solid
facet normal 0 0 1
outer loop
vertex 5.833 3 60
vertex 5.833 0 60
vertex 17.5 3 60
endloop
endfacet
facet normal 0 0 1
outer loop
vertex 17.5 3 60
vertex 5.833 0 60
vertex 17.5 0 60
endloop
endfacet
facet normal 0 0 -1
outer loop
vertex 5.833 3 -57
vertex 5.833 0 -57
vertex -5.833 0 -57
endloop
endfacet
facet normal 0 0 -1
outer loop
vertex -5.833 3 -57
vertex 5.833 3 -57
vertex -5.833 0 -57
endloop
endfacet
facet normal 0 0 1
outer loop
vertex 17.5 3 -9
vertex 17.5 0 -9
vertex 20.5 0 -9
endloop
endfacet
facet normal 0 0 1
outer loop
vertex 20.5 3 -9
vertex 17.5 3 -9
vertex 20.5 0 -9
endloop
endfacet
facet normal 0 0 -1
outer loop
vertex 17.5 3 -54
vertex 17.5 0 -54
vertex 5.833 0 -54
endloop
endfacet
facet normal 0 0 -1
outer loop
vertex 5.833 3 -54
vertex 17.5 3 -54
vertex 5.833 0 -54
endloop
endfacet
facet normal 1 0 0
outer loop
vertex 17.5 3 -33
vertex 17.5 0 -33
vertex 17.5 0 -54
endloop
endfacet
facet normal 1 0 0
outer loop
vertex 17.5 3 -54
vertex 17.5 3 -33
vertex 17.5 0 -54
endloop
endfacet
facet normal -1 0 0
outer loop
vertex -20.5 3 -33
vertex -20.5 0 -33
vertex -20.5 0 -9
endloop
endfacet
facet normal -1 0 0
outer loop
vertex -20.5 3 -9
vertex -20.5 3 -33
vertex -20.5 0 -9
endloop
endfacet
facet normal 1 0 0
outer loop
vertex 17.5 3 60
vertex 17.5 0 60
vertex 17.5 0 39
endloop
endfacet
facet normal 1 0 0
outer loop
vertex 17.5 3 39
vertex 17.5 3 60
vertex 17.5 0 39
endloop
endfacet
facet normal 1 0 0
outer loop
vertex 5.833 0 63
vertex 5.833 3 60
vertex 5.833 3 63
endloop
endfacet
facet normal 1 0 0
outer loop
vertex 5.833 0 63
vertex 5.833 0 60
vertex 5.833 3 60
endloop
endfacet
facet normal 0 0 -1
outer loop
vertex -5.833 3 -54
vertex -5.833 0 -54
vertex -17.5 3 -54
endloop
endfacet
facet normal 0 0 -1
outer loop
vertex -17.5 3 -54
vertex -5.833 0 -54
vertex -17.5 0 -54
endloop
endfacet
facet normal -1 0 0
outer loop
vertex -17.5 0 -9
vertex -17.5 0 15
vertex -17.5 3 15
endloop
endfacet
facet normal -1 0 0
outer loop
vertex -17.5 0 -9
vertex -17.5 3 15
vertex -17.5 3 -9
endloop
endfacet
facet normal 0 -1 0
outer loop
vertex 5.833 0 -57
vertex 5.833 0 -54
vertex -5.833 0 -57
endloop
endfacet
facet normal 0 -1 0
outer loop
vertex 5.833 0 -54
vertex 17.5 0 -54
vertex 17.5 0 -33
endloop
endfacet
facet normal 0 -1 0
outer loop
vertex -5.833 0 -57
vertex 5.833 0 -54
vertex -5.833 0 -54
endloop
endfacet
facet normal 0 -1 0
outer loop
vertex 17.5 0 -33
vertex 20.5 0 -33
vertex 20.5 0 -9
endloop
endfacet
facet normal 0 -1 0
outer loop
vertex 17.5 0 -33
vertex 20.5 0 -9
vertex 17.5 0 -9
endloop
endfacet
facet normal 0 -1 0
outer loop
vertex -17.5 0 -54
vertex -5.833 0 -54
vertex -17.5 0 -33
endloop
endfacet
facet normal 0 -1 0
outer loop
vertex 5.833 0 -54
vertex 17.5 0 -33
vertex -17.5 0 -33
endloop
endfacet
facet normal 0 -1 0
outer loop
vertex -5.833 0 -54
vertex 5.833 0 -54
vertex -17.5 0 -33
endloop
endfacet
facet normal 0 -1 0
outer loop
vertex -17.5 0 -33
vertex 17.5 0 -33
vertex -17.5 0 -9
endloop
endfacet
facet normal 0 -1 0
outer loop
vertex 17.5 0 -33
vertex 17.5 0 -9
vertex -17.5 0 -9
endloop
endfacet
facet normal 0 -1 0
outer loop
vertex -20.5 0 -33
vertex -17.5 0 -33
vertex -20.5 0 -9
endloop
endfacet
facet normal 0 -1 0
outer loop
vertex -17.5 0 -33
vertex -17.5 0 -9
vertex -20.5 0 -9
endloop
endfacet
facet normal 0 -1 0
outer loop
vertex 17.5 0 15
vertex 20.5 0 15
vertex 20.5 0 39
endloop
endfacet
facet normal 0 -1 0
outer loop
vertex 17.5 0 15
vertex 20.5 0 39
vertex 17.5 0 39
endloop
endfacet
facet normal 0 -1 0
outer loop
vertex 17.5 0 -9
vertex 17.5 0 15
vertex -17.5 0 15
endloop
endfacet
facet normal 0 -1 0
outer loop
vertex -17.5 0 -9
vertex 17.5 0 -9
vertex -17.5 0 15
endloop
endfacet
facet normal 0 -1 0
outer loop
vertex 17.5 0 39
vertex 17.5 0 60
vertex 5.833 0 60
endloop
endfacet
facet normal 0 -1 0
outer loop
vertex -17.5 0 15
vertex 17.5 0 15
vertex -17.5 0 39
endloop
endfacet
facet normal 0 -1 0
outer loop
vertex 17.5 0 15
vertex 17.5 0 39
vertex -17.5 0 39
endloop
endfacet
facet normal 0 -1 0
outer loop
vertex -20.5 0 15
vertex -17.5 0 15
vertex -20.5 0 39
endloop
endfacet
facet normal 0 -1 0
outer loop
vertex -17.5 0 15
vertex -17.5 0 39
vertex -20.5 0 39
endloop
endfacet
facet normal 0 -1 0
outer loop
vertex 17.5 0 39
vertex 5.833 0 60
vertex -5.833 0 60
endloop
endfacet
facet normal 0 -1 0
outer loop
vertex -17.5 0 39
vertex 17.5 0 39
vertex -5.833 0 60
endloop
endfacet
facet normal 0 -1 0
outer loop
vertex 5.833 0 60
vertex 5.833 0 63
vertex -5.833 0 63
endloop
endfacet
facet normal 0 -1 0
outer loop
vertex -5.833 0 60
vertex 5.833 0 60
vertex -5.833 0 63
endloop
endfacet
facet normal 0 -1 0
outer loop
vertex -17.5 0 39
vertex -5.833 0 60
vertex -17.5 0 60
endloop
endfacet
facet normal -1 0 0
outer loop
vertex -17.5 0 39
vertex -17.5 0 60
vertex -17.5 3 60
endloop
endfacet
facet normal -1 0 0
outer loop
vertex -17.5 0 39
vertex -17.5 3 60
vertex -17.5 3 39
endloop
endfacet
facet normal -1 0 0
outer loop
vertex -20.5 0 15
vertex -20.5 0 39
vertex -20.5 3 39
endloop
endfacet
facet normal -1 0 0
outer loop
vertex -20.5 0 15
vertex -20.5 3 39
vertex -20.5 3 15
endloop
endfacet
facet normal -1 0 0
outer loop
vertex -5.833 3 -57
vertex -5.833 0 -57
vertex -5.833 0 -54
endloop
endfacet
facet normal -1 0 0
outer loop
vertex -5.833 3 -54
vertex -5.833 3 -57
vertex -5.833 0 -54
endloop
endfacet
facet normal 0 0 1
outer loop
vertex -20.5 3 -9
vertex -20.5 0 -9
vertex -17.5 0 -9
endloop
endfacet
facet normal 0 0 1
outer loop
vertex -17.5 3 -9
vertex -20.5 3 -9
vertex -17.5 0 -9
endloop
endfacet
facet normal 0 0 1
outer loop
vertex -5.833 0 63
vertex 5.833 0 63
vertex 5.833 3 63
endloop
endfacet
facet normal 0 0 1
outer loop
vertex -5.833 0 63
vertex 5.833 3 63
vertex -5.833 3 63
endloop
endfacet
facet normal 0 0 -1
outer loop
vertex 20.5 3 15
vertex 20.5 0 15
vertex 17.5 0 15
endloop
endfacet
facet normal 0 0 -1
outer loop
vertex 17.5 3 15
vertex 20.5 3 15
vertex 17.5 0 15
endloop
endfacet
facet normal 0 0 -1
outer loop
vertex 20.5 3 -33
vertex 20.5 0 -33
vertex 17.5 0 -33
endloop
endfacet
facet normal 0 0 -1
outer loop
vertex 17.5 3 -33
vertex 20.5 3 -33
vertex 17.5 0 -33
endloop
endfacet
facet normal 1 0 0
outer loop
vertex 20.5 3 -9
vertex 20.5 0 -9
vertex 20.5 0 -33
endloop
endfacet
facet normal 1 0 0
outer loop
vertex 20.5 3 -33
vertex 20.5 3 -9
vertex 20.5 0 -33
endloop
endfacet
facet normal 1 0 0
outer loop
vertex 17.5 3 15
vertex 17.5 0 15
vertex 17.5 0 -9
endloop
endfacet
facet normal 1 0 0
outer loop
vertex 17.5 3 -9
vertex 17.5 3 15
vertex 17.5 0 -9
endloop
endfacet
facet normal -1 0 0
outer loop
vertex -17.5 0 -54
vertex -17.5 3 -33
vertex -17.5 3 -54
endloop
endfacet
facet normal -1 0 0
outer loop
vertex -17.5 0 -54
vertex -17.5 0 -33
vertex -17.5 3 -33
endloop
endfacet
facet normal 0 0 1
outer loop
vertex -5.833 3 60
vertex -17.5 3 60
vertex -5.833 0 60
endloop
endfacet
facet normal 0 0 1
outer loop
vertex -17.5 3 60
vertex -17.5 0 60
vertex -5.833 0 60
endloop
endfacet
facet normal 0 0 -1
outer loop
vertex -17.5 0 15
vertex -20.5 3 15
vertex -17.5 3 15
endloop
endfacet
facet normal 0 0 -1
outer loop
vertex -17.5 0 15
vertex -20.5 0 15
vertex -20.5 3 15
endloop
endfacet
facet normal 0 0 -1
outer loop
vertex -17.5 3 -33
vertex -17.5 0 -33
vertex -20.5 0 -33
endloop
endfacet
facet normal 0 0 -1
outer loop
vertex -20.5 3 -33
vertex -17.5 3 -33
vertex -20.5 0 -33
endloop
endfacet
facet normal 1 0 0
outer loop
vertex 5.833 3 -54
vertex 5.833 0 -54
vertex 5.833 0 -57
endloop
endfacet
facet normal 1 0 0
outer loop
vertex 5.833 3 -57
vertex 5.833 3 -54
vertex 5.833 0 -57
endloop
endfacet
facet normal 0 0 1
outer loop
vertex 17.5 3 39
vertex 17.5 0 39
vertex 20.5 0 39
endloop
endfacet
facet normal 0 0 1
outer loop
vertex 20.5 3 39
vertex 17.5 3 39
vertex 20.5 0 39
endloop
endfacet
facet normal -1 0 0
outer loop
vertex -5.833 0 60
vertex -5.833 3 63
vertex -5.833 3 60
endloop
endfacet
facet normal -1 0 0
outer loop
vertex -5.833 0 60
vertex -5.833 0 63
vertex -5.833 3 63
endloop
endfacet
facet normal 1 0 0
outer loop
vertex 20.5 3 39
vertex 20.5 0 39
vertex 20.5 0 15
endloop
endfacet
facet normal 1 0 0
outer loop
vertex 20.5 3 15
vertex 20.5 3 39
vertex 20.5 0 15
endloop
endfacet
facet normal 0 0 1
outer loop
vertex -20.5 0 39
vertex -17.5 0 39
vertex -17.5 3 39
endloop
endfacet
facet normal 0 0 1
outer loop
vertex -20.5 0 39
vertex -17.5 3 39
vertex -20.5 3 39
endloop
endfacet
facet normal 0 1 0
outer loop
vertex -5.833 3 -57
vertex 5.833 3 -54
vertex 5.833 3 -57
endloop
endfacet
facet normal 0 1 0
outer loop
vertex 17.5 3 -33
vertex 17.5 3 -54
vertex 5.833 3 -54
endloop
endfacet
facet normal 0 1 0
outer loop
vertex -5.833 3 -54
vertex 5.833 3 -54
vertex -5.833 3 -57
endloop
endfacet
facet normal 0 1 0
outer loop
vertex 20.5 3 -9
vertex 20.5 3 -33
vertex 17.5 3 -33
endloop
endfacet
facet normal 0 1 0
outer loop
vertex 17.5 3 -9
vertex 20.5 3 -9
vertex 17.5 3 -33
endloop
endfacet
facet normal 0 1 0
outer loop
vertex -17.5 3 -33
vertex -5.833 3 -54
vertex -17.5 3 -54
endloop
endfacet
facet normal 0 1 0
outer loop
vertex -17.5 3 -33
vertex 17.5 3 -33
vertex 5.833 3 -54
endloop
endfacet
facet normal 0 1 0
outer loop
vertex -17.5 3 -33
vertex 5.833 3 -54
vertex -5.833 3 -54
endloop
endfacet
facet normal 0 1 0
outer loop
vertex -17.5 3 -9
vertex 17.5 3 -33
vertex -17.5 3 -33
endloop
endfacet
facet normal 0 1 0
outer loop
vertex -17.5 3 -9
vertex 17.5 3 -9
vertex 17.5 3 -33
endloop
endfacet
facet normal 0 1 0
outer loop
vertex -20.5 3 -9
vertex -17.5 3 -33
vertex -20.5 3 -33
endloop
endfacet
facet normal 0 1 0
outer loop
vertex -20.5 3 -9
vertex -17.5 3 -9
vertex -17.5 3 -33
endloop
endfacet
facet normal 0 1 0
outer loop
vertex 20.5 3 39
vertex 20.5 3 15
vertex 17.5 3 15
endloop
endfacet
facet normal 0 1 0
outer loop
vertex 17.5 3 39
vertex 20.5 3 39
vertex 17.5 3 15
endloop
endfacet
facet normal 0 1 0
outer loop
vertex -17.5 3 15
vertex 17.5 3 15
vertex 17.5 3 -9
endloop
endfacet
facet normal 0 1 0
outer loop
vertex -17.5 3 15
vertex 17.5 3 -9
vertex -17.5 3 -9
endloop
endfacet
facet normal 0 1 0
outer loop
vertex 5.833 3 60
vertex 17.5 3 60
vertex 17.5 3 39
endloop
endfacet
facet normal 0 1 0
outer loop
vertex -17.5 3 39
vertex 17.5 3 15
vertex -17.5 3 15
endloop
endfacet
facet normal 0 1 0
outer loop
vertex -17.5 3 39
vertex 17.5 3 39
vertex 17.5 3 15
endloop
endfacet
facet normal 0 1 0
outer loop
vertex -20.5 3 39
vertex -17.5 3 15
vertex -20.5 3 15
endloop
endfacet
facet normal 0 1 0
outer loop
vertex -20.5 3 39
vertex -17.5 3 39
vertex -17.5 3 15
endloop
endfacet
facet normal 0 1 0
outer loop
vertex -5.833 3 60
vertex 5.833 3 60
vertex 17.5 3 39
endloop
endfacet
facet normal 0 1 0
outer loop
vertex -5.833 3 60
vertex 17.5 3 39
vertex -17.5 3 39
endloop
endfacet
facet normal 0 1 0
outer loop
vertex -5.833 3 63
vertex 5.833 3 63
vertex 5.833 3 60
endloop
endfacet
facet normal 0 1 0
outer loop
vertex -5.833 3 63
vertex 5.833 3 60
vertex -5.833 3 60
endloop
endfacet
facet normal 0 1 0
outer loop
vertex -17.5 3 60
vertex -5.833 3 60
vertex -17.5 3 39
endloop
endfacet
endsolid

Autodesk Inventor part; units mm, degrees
ref_plane "YZ Plane" through (0, 0, 0) normal (1, 0, 0) x (0, 1, 0)
ref_plane "XZ Plane" through (0, 0, 0) normal (0, 1, 0) x (-1, 0, 0)
ref_plane "XY Plane" through (0, 0, 0) normal (0, 0, 1) x (1, 0, 0)
sketch "Sketch1" plane through (0, 0, 0) normal (0, 1, 0) x (-1, 0, 0)
  line L0 (-2.5, -54) -> (-2.5, -54)
  line L1 (-2.5, -54) -> (2.5, -54)
  line L2 (2.5, -54) -> (2.5, -54)
  line L3 (-12.5, -54) -> (-12.5, -54)
  line L4 (-12.5, -54) -> (-7.5, -54)
  line L5 (-7.5, -54) -> (-7.5, -54)
  line L6 (12.5, -54) -> (12.5, -54)
  line L7 (12.5, -54) -> (7.5, -54)
  line L8 (7.5, -54) -> (7.5, -54)
  line L9 (7.5, 60) -> (7.5, 60)
  line L10 (7.5, 60) -> (12.5, 60)
  line L11 (12.5, 60) -> (12.5, 60)
  line L12 (-2.5, 60) -> (-2.5, 60)
  line L13 (-2.5, 60) -> (2.5, 60)
  line L14 (2.5, 60) -> (2.5, 60)
  line L15 (-12.5, 60) -> (-12.5, 60)
  line L16 (-12.5, 60) -> (-7.5, 60)
  line L17 (-7.5, 60) -> (-7.5, 60)
  line L18 (17.5, 60) -> (17.5, 60)
  line L19 (17.5, -54) -> (17.5, -54)
  line L20 (-17.5, 60) -> (-17.5, 60)
  line L21 (-17.5, -54) -> (-17.5, -54)
  line L22 (17.5, -54) -> (17.5, -54)
  line L23 (17.5, 60) -> (17.5, 60)
  line L24 (12.5, -54) -> (17.5, -54)
  line L25 (2.5, -54) -> (7.5, -54)
  line L26 (-17.5, -54) -> (-12.5, -54)
  line L27 (-7.5, -54) -> (-2.5, -54)
  line L28 (-17.5, 60) -> (-17.5, 60)
  line L29 (-17.5, -54) -> (-17.5, -54)
  line L30 (-12.5, 60) -> (-17.5, 60)
  line L31 (-2.5, 60) -> (-7.5, 60)
  line L32 (17.5, 60) -> (12.5, 60)
  line L33 (7.5, 60) -> (2.5, 60)
  line L34 (17.5, -33) -> (20.5, -33)
  line L35 (20.5, -33) -> (20.5, -9)
  line L36 (20.5, -9) -> (17.5, -9)
  line L37 (17.5, 39) -> (20.5, 39)
  line L38 (20.5, 39) -> (20.5, 15)
  line L39 (20.5, 15) -> (17.5, 15)
  line L40 (-17.5, 39) -> (-20.5, 39)
  line L41 (-20.5, 39) -> (-20.5, 15)
  line L42 (-20.5, 15) -> (-17.5, 15)
  line L43 (-17.5, -9) -> (-20.5, -9)
  line L44 (-20.5, -9) -> (-20.5, -33)
  line L45 (-20.5, -33) -> (-17.5, -33)
  line L46 (17.5, -33) -> (17.5, -54)
  line L47 (17.5, 60) -> (17.5, 39)
  line L48 (17.5, 15) -> (17.5, -9)
  line L49 (-17.5, 60) -> (-17.5, 39)
  line L50 (-17.5, 15) -> (-17.5, -9)
  line L51 (-17.5, -33) -> (-17.5, -54)
  line L52 (5.8333, 60) -> (-5.8333, 60)
  line L53 (-5.8333, 60) -> (-5.8333, 63)
  line L54 (-5.8333, 63) -> (5.8333, 63)
  line L55 (5.8333, 63) -> (5.8333, 60)
  line L56 (5.8333, -54) -> (-5.8333, -54)
  line L57 (-5.8333, -54) -> (-5.8333, -57)
  line L58 (-5.8333, -57) -> (5.8333, -57)
  line L59 (5.8333, -57) -> (5.8333, -54)
  point P0 (0, 0)
  point P1 (-17.5, 50)
  point P2 (-17.5, -44)
  point P3 (17.5, -44)
  point P4 (17.5, 50)
  point P5 (-5.8333, 60)
  dimension "d40" = 35
  dimension "d49" = 0
  dimension "d50" = 0
  dimension "d55" = 17.5
  dimension "d56" = 60
  dimension "d57" = 114
  dimension "d58" = 0
  dimension "d59" = 0
  dimension "d62" = 24
  dimension "d63" = 24
  dimension "d65" = 3
  dimension "d66" = 21
  dimension "d67" = 11.6667
  dimension "d68" = 11.6667
  dimension "d69" = 3
  dimension "d70" = 3
extrude "Extrusion1" add sketch "Sketch1" along normal blind 3
equation "\"d40\" = shelfH"
equation "\"d55\" = 0.5 * shelfH"
equation "\"d56\" = 0.5 * ht"
equation "\"d57\" = -2 * tt + ht"
equation "\"d62\" = 0.2 * ht + 2 * tol"
equation "\"d63\" = 0.2 * ht - 2 * tol"
equation "\"d65\" = tt"
equation "\"d66\" = 0.2 * ht - tt"
equation "\"d67\" = 0.333333 * shelfH + 2 * tol"
equation "\"d68\" = 0.333333 * shelfH - tol"
equation "\"d69\" = tt"
equation "\"d70\" = tt"
equation "\"d31\" = tt"
equation "\"d4\" = tt"
equation "\"tt\" = 3"
equation "\"tol\" = 0"
equation "\"tiroir\" = 1"
equation "\"nHoles\" = 4"
equation "\"shelfH\" = 35"
equation "\"d42\" = 0.5 * shelfH"
equation "\"d43\" = 0.5 * shelfH"
equation "\"ht\" = 120"
properties part number "base"
